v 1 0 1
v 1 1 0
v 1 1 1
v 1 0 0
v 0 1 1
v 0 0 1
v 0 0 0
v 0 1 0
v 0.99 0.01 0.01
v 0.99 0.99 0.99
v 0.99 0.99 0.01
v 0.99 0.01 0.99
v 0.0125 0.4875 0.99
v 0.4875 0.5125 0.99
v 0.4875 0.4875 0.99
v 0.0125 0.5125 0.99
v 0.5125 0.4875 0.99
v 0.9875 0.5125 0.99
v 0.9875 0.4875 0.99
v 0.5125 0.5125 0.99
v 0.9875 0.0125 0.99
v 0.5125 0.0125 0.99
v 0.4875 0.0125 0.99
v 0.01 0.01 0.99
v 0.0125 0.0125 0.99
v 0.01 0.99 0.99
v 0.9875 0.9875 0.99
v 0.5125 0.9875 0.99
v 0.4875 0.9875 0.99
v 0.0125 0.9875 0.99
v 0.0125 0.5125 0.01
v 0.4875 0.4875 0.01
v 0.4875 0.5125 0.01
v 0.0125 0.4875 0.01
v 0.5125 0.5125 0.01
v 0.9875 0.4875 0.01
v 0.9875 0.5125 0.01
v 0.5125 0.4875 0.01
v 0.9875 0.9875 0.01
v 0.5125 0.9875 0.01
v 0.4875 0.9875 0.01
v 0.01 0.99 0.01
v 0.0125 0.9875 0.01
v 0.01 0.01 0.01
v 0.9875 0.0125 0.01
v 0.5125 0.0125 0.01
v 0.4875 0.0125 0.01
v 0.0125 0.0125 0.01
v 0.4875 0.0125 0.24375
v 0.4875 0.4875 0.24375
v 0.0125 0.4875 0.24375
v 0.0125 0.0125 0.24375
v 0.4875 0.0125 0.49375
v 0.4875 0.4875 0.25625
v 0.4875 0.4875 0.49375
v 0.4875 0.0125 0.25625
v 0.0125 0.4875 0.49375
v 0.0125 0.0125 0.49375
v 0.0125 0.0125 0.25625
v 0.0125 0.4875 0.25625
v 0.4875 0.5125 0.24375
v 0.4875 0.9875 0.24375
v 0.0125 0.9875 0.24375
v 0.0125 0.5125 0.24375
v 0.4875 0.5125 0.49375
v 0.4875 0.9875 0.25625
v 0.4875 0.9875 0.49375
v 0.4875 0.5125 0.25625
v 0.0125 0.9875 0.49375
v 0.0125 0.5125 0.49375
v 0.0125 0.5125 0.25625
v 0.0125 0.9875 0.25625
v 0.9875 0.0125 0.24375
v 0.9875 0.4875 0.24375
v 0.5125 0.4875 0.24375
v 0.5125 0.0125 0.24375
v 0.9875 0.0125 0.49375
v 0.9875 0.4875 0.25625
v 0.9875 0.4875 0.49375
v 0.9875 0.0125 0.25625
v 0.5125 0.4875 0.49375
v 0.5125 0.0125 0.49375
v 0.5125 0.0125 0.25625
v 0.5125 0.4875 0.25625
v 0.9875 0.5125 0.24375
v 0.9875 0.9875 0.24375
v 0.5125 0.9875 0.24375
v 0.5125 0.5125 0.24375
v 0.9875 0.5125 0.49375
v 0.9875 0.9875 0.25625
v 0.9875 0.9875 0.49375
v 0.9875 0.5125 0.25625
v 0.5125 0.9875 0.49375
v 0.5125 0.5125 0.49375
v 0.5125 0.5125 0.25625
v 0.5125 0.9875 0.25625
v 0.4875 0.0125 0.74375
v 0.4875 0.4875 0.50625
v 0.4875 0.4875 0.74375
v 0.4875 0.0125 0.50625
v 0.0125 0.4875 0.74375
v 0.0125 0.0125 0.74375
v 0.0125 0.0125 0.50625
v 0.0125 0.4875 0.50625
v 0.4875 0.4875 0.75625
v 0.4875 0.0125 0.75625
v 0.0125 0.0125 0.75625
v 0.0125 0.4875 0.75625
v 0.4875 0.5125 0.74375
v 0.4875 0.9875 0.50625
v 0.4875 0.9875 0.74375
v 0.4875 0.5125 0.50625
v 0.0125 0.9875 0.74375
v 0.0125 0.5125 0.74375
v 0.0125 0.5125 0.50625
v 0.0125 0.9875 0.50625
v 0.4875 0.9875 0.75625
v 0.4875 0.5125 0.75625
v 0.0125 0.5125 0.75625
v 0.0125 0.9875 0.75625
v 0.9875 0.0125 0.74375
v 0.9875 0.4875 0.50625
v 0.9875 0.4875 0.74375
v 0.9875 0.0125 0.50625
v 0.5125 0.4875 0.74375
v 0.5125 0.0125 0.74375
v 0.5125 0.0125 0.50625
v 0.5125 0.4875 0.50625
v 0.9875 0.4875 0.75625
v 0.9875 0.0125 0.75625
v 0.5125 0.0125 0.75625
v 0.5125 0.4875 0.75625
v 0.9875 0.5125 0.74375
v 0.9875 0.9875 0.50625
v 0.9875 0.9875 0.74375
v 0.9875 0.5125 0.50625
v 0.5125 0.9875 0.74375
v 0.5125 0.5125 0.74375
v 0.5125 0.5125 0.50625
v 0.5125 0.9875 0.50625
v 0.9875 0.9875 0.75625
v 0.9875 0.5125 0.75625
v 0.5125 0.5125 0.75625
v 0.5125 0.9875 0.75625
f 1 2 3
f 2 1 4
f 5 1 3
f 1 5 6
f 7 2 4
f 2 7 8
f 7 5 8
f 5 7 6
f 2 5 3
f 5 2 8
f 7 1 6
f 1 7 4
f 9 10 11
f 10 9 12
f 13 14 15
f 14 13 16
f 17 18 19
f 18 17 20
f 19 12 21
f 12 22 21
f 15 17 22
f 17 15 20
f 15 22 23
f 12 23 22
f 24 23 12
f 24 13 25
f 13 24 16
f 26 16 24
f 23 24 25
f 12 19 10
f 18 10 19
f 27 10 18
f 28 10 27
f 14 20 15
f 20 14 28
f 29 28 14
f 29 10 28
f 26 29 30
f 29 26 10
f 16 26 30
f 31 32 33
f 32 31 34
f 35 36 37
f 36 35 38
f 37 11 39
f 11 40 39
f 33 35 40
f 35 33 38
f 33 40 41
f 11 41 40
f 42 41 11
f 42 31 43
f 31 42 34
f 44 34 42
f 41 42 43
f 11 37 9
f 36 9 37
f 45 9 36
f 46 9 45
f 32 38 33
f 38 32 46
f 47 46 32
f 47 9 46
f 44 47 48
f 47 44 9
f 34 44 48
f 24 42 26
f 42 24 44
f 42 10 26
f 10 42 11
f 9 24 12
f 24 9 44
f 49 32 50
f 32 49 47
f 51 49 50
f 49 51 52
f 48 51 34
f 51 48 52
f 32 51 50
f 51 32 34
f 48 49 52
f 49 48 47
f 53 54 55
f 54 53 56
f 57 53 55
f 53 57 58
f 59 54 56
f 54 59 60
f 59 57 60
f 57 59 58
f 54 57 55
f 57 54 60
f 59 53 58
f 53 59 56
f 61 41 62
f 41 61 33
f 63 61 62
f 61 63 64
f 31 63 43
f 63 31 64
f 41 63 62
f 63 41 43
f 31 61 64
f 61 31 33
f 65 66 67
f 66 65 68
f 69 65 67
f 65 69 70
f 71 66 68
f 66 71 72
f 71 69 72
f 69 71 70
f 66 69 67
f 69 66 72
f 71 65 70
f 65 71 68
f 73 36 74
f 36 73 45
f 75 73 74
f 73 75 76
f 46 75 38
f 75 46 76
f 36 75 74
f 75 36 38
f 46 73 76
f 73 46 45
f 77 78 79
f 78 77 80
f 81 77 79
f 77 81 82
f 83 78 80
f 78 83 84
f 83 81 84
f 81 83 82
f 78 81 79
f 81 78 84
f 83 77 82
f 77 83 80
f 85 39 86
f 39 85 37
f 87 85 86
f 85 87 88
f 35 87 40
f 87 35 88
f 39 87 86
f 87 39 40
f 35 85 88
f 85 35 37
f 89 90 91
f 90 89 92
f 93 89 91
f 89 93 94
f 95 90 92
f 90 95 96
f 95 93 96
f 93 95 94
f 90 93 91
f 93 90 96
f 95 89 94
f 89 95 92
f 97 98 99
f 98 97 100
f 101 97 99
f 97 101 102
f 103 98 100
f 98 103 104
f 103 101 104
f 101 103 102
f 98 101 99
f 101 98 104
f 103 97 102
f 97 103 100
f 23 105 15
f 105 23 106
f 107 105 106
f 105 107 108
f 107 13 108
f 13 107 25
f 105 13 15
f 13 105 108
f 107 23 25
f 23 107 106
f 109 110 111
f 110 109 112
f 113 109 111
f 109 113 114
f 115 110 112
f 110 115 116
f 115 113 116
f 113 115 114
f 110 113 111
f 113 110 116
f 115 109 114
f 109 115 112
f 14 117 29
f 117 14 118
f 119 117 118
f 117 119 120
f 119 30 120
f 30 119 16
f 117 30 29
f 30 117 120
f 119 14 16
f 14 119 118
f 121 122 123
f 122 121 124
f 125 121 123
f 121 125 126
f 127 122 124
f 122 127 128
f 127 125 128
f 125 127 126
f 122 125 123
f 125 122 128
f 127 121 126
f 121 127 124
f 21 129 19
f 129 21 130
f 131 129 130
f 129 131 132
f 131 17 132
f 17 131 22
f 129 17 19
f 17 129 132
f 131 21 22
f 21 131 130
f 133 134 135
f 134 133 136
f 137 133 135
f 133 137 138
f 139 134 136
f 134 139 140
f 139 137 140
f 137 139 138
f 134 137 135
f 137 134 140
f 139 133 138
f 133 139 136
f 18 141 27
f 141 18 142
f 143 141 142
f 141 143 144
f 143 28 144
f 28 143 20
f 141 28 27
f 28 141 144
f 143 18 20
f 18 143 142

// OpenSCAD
translate([0.25, 0.25, 0.125]) color([0.4290055928665458, 0.23453812170718102, 0.15439335522424358]) cube([0.475, 0.475, 0.2375], center=true);
translate([0.25, 0.25, 0.375]) color([0.8093231568725141, 0.08633567891086813, 0.17786797451849035]) cube([0.475, 0.475, 0.2375], center=true);
translate([0.25, 0.75, 0.125]) color([0.597908209516087, 0.2049302140046264, 0.38259819383496607]) cube([0.475, 0.475, 0.2375], center=true);
translate([0.25, 0.75, 0.375]) color([0.09820935578849854, 0.7126580228806777, 0.12963285250031453]) cube([0.475, 0.475, 0.2375], center=true);
translate([0.75, 0.25, 0.125]) color([0.1405419357639307, 0.15005427666135895, 0.21625088311912088]) cube([0.475, 0.475, 0.2375], center=true);
translate([0.75, 0.25, 0.375]) color([0.32525440064043776, 0.7889538383345114, 0.903373120230993]) cube([0.475, 0.475, 0.2375], center=true);
translate([0.75, 0.75, 0.125]) color([0.06977575266170288, 0.7362720839865503, 0.2020320956073609]) cube([0.475, 0.475, 0.2375], center=true);
translate([0.75, 0.75, 0.375]) color([0.5423401186675025, 0.3142030079413114, 0.2863028083493637]) cube([0.475, 0.475, 0.2375], center=true);
translate([0.25, 0.25, 0.625]) color([0.2877204404819569, 0.28152403442233176, 0.5360057575380175]) cube([0.475, 0.475, 0.2375], center=true);
translate([0.25, 0.25, 0.875]) color([0.5485858365689398, 0.3160912847100037, 0.1726206824472417]) cube([0.475, 0.475, 0.2375], center=true);
translate([0.25, 0.75, 0.625]) color([0.9286524442978176, 0.2763596658323645, 0.9635545390661618]) cube([0.475, 0.475, 0.2375], center=true);
translate([0.25, 0.75, 0.875]) color([0.008450209499696881, 0.9833800899883325, 0.7835523513514916]) cube([0.475, 0.475, 0.2375], center=true);
translate([0.75, 0.25, 0.625]) color([0.2873354165488382, 0.1255494074447594, 0.7210090079272947]) cube([0.475, 0.475, 0.2375], center=true);
translate([0.75, 0.25, 0.875]) color([0.08812737617158117, 0.398236089702665, 0.7163432287626534]) cube([0.475, 0.475, 0.2375], center=true);
translate([0.75, 0.75, 0.625]) color([0.6622406155683929, 0.5366635589440476, 0.34207905320638676]) cube([0.475, 0.475, 0.2375], center=true);
translate([0.75, 0.75, 0.875]) color([0.13074362195156275, 0.8461927484521828, 0.3676559052771552]) cube([0.475, 0.475, 0.2375], center=true);
color([0.3,0.3,0.3,0.3]) difference() { cube([1,1,1]); translate([0.01,0.01,0.01]) cube([0.98,0.98,0.98]); }
